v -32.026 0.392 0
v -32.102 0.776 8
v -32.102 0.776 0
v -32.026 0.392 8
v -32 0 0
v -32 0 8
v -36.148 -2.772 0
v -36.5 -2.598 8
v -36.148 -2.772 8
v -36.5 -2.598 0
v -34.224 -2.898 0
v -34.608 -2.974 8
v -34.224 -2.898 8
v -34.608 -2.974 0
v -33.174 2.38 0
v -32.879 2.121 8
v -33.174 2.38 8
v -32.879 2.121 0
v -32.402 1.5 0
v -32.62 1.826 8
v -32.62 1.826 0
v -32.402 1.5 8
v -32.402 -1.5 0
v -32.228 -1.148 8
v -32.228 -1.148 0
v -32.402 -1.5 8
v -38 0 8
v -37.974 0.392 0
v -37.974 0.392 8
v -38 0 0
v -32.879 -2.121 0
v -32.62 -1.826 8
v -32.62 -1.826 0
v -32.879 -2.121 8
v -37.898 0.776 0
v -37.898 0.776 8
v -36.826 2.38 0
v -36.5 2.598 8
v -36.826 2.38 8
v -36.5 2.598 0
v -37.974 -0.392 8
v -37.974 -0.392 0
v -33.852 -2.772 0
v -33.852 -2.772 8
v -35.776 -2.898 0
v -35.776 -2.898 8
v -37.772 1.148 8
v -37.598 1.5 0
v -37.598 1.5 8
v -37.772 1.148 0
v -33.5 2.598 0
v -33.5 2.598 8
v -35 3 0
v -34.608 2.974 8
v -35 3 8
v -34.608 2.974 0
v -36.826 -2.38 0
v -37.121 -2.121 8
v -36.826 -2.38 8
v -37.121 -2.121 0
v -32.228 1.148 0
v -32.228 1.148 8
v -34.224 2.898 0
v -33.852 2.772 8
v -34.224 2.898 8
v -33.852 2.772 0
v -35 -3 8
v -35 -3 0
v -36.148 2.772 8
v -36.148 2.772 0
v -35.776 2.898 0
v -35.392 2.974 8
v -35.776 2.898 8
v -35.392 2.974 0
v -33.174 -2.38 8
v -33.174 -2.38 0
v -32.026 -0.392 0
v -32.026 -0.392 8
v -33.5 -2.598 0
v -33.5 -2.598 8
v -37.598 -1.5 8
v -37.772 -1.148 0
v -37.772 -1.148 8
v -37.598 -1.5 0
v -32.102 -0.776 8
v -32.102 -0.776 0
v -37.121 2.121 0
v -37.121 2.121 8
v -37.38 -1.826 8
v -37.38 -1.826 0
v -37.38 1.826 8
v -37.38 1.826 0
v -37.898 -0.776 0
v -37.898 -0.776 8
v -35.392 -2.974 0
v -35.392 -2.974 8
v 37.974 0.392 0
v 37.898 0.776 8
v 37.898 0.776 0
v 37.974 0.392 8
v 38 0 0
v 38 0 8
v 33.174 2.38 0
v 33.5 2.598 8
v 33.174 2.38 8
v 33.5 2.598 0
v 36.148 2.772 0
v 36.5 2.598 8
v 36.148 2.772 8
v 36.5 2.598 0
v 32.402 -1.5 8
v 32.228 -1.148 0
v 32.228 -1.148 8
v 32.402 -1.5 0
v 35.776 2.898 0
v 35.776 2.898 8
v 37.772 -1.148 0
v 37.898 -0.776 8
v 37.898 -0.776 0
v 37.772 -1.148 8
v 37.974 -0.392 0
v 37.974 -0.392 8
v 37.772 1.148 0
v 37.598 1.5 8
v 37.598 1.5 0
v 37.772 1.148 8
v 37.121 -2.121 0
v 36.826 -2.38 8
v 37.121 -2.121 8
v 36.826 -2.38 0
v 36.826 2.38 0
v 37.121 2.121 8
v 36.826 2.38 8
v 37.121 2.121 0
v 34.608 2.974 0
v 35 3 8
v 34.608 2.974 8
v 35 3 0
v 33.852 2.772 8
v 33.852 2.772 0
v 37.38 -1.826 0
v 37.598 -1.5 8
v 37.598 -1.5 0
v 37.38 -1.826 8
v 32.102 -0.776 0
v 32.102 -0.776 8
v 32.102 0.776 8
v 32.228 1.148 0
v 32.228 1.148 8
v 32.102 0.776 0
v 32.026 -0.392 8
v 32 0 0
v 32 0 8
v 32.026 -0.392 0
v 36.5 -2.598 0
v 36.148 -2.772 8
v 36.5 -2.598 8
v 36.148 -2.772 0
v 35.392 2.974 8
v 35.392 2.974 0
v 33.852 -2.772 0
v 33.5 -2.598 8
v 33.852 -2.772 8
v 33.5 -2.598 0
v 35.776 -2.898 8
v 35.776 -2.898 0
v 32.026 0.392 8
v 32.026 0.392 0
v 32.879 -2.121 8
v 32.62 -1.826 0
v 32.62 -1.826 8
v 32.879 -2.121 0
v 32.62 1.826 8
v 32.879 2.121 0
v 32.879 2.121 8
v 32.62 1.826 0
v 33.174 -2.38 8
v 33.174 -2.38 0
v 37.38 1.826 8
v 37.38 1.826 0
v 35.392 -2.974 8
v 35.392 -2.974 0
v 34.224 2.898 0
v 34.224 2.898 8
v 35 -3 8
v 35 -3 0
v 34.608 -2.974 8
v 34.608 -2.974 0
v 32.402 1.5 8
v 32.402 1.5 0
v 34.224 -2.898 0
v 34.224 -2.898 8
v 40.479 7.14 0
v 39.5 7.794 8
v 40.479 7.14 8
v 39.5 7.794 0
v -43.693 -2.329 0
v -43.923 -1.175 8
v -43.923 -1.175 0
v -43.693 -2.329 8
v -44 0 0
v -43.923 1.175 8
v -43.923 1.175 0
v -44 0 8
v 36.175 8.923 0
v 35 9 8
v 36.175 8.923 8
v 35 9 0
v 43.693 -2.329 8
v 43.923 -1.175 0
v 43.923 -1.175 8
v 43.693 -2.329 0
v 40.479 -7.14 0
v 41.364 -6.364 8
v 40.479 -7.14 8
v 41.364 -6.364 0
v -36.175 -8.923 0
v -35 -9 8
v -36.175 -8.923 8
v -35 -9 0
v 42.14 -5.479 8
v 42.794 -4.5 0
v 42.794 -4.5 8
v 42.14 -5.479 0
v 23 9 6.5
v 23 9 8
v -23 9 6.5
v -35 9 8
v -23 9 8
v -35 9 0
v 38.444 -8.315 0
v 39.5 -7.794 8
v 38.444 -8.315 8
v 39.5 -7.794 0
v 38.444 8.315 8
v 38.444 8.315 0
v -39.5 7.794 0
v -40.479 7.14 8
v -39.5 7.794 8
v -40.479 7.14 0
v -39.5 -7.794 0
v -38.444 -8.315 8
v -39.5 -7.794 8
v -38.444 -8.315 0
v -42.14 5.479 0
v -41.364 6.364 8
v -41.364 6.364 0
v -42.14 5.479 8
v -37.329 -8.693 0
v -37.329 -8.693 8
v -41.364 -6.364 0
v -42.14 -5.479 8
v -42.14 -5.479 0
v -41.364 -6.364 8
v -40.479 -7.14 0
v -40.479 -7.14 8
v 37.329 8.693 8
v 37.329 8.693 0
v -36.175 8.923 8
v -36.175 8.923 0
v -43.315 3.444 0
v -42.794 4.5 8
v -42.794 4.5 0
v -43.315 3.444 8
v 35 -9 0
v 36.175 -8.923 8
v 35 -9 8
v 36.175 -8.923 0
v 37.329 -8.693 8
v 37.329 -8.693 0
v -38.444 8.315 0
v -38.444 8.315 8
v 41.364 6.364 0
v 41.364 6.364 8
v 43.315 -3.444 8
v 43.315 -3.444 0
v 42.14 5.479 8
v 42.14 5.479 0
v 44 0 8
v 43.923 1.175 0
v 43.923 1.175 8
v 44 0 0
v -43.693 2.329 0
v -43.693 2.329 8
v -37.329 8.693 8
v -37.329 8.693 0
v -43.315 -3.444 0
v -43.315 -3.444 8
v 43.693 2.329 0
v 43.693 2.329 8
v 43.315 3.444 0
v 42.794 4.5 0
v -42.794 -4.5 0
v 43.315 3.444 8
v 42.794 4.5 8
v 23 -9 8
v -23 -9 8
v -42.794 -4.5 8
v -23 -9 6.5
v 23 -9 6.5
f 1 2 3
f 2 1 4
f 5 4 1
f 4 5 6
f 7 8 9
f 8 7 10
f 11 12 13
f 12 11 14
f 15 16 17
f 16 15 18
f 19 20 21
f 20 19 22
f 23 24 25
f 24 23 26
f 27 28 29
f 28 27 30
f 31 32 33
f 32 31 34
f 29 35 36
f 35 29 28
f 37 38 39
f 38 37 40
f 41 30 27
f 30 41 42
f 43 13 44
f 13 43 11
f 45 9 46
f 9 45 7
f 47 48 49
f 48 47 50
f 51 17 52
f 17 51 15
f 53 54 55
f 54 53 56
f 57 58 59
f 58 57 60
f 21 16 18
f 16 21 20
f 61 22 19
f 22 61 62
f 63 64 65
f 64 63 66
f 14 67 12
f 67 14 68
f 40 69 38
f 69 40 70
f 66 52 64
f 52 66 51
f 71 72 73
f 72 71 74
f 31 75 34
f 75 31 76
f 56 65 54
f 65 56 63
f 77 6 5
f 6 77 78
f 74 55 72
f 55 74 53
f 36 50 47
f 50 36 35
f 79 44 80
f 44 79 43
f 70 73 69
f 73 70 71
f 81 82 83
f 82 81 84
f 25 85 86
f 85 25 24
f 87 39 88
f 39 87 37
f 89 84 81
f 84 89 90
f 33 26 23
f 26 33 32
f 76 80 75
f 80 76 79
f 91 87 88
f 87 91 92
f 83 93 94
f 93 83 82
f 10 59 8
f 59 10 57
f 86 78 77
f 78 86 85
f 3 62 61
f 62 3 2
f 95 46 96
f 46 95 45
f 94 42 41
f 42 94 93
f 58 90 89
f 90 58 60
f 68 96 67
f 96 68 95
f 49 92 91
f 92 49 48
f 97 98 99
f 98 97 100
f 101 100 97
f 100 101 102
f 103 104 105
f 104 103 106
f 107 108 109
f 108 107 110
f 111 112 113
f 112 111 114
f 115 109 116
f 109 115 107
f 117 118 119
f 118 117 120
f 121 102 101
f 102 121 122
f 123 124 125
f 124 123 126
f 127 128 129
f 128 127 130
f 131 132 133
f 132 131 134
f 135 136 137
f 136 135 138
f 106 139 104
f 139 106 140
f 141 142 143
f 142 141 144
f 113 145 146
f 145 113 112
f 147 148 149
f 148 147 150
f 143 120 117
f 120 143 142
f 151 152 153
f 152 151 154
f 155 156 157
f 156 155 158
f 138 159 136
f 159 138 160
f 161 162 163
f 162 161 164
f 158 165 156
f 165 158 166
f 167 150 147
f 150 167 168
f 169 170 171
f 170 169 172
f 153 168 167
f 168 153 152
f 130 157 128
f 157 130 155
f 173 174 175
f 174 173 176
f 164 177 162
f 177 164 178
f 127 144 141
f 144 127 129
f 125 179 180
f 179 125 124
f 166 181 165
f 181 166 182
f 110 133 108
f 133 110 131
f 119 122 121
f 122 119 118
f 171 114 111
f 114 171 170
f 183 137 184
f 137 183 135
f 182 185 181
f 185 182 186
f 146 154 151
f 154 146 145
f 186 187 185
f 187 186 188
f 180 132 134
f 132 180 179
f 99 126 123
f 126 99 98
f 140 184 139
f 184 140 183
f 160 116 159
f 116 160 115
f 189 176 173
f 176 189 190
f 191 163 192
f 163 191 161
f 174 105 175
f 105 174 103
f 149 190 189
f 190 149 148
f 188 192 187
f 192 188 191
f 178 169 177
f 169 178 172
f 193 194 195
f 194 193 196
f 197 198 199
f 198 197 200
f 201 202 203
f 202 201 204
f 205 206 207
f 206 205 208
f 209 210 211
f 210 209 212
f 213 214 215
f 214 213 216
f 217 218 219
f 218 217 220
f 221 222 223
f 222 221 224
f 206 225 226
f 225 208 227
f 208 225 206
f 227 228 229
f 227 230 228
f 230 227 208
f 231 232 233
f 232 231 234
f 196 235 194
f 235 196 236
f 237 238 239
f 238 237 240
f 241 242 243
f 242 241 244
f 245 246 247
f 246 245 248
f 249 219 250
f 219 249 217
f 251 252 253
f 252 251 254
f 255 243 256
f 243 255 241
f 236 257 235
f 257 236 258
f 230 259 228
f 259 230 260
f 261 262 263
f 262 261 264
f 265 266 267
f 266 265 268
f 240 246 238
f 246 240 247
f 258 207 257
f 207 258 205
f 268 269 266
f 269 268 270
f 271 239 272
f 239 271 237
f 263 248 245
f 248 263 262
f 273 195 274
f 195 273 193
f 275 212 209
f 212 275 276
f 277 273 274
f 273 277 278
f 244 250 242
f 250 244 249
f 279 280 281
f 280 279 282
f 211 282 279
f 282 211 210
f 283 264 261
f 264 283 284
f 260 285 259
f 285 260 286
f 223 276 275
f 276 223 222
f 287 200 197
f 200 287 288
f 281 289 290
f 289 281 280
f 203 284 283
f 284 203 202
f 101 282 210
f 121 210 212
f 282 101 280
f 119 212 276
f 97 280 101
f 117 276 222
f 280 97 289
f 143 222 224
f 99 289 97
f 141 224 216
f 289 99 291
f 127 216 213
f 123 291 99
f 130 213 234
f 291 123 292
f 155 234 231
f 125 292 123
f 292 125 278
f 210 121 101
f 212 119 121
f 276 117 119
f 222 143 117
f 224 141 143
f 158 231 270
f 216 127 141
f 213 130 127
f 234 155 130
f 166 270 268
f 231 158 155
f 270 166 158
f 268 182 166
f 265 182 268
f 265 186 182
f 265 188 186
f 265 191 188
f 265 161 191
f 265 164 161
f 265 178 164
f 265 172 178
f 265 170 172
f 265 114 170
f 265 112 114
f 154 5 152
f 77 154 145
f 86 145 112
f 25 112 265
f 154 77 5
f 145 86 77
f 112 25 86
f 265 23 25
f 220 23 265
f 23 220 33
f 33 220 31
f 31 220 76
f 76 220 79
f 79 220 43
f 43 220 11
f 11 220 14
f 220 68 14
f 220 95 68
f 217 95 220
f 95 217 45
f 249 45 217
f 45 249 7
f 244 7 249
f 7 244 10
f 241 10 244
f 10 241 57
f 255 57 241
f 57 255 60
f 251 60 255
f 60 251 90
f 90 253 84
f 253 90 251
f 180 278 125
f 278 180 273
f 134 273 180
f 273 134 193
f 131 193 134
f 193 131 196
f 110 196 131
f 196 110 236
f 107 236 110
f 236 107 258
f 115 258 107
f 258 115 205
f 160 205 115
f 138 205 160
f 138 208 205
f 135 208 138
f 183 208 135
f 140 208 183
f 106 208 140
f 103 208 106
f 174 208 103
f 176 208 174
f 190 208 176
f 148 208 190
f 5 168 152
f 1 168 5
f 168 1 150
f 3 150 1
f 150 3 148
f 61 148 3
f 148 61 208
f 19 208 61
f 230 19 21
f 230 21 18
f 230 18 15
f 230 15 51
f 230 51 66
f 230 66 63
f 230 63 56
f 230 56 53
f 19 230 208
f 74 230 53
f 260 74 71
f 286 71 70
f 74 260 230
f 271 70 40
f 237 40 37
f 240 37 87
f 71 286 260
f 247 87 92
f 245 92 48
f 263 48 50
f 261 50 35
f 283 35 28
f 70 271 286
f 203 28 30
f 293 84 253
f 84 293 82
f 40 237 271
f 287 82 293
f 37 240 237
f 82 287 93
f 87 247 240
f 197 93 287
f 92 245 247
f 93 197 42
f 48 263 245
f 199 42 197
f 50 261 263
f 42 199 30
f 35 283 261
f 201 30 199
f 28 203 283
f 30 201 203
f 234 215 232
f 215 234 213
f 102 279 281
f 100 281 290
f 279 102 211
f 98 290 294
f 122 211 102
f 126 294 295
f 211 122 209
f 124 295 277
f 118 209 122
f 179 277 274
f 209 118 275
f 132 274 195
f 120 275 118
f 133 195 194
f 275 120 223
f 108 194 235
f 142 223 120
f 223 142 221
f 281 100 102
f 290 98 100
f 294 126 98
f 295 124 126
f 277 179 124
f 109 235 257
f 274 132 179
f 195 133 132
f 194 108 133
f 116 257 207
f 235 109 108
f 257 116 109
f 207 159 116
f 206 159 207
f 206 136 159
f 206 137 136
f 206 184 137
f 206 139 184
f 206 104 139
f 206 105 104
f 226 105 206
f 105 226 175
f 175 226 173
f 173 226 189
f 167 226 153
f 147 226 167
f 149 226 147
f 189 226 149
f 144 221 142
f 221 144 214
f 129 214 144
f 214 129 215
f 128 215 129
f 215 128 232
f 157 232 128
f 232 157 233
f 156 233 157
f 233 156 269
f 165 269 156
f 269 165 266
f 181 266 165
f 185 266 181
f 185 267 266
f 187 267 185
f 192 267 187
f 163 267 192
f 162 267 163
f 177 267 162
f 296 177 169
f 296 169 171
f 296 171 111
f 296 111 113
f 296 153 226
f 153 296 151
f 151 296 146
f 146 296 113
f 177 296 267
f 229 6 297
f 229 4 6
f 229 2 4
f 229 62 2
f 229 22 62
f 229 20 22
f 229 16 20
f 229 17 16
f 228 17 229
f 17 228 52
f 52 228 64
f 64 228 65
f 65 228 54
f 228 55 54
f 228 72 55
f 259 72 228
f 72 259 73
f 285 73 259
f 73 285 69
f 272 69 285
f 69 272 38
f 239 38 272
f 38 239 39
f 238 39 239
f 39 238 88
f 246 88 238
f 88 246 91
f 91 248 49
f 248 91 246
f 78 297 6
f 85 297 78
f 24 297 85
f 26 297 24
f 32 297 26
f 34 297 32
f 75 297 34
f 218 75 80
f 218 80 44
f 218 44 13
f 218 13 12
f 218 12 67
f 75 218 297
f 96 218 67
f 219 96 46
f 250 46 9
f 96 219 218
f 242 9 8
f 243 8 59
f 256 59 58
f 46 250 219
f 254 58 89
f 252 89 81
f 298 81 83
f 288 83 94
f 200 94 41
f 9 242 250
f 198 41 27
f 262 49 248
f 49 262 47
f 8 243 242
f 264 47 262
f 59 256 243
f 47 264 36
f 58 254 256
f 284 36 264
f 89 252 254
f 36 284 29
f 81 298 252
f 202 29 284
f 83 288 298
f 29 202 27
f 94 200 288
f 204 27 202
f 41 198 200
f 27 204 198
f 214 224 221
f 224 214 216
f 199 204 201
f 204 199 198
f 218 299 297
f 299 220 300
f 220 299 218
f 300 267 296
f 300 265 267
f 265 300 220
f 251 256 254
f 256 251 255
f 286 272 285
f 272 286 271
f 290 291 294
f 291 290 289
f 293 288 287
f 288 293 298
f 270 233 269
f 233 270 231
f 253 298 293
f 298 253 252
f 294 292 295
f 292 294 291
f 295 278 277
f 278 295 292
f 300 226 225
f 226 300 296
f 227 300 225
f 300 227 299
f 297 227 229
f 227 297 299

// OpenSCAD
// Dog-bone antenna end insulator. CC0. Print in ASA/PETG, 100% infill for wire antennas.
len = 70; wid = 18; thick = 8; hole = 6;
$fn = 48;
difference() {
  hull() for (x = [-len / 2, len / 2]) translate([x, 0, 0]) cylinder(d = wid, h = thick);
  for (x = [-len / 2, len / 2]) translate([x, 0, -1]) cylinder(d = hole, h = thick + 2);
  translate([-len / 2 + hole + 6, -wid, thick - 1.5]) cube([len - 2 * hole - 12, 2 * wid, 2]);
}
